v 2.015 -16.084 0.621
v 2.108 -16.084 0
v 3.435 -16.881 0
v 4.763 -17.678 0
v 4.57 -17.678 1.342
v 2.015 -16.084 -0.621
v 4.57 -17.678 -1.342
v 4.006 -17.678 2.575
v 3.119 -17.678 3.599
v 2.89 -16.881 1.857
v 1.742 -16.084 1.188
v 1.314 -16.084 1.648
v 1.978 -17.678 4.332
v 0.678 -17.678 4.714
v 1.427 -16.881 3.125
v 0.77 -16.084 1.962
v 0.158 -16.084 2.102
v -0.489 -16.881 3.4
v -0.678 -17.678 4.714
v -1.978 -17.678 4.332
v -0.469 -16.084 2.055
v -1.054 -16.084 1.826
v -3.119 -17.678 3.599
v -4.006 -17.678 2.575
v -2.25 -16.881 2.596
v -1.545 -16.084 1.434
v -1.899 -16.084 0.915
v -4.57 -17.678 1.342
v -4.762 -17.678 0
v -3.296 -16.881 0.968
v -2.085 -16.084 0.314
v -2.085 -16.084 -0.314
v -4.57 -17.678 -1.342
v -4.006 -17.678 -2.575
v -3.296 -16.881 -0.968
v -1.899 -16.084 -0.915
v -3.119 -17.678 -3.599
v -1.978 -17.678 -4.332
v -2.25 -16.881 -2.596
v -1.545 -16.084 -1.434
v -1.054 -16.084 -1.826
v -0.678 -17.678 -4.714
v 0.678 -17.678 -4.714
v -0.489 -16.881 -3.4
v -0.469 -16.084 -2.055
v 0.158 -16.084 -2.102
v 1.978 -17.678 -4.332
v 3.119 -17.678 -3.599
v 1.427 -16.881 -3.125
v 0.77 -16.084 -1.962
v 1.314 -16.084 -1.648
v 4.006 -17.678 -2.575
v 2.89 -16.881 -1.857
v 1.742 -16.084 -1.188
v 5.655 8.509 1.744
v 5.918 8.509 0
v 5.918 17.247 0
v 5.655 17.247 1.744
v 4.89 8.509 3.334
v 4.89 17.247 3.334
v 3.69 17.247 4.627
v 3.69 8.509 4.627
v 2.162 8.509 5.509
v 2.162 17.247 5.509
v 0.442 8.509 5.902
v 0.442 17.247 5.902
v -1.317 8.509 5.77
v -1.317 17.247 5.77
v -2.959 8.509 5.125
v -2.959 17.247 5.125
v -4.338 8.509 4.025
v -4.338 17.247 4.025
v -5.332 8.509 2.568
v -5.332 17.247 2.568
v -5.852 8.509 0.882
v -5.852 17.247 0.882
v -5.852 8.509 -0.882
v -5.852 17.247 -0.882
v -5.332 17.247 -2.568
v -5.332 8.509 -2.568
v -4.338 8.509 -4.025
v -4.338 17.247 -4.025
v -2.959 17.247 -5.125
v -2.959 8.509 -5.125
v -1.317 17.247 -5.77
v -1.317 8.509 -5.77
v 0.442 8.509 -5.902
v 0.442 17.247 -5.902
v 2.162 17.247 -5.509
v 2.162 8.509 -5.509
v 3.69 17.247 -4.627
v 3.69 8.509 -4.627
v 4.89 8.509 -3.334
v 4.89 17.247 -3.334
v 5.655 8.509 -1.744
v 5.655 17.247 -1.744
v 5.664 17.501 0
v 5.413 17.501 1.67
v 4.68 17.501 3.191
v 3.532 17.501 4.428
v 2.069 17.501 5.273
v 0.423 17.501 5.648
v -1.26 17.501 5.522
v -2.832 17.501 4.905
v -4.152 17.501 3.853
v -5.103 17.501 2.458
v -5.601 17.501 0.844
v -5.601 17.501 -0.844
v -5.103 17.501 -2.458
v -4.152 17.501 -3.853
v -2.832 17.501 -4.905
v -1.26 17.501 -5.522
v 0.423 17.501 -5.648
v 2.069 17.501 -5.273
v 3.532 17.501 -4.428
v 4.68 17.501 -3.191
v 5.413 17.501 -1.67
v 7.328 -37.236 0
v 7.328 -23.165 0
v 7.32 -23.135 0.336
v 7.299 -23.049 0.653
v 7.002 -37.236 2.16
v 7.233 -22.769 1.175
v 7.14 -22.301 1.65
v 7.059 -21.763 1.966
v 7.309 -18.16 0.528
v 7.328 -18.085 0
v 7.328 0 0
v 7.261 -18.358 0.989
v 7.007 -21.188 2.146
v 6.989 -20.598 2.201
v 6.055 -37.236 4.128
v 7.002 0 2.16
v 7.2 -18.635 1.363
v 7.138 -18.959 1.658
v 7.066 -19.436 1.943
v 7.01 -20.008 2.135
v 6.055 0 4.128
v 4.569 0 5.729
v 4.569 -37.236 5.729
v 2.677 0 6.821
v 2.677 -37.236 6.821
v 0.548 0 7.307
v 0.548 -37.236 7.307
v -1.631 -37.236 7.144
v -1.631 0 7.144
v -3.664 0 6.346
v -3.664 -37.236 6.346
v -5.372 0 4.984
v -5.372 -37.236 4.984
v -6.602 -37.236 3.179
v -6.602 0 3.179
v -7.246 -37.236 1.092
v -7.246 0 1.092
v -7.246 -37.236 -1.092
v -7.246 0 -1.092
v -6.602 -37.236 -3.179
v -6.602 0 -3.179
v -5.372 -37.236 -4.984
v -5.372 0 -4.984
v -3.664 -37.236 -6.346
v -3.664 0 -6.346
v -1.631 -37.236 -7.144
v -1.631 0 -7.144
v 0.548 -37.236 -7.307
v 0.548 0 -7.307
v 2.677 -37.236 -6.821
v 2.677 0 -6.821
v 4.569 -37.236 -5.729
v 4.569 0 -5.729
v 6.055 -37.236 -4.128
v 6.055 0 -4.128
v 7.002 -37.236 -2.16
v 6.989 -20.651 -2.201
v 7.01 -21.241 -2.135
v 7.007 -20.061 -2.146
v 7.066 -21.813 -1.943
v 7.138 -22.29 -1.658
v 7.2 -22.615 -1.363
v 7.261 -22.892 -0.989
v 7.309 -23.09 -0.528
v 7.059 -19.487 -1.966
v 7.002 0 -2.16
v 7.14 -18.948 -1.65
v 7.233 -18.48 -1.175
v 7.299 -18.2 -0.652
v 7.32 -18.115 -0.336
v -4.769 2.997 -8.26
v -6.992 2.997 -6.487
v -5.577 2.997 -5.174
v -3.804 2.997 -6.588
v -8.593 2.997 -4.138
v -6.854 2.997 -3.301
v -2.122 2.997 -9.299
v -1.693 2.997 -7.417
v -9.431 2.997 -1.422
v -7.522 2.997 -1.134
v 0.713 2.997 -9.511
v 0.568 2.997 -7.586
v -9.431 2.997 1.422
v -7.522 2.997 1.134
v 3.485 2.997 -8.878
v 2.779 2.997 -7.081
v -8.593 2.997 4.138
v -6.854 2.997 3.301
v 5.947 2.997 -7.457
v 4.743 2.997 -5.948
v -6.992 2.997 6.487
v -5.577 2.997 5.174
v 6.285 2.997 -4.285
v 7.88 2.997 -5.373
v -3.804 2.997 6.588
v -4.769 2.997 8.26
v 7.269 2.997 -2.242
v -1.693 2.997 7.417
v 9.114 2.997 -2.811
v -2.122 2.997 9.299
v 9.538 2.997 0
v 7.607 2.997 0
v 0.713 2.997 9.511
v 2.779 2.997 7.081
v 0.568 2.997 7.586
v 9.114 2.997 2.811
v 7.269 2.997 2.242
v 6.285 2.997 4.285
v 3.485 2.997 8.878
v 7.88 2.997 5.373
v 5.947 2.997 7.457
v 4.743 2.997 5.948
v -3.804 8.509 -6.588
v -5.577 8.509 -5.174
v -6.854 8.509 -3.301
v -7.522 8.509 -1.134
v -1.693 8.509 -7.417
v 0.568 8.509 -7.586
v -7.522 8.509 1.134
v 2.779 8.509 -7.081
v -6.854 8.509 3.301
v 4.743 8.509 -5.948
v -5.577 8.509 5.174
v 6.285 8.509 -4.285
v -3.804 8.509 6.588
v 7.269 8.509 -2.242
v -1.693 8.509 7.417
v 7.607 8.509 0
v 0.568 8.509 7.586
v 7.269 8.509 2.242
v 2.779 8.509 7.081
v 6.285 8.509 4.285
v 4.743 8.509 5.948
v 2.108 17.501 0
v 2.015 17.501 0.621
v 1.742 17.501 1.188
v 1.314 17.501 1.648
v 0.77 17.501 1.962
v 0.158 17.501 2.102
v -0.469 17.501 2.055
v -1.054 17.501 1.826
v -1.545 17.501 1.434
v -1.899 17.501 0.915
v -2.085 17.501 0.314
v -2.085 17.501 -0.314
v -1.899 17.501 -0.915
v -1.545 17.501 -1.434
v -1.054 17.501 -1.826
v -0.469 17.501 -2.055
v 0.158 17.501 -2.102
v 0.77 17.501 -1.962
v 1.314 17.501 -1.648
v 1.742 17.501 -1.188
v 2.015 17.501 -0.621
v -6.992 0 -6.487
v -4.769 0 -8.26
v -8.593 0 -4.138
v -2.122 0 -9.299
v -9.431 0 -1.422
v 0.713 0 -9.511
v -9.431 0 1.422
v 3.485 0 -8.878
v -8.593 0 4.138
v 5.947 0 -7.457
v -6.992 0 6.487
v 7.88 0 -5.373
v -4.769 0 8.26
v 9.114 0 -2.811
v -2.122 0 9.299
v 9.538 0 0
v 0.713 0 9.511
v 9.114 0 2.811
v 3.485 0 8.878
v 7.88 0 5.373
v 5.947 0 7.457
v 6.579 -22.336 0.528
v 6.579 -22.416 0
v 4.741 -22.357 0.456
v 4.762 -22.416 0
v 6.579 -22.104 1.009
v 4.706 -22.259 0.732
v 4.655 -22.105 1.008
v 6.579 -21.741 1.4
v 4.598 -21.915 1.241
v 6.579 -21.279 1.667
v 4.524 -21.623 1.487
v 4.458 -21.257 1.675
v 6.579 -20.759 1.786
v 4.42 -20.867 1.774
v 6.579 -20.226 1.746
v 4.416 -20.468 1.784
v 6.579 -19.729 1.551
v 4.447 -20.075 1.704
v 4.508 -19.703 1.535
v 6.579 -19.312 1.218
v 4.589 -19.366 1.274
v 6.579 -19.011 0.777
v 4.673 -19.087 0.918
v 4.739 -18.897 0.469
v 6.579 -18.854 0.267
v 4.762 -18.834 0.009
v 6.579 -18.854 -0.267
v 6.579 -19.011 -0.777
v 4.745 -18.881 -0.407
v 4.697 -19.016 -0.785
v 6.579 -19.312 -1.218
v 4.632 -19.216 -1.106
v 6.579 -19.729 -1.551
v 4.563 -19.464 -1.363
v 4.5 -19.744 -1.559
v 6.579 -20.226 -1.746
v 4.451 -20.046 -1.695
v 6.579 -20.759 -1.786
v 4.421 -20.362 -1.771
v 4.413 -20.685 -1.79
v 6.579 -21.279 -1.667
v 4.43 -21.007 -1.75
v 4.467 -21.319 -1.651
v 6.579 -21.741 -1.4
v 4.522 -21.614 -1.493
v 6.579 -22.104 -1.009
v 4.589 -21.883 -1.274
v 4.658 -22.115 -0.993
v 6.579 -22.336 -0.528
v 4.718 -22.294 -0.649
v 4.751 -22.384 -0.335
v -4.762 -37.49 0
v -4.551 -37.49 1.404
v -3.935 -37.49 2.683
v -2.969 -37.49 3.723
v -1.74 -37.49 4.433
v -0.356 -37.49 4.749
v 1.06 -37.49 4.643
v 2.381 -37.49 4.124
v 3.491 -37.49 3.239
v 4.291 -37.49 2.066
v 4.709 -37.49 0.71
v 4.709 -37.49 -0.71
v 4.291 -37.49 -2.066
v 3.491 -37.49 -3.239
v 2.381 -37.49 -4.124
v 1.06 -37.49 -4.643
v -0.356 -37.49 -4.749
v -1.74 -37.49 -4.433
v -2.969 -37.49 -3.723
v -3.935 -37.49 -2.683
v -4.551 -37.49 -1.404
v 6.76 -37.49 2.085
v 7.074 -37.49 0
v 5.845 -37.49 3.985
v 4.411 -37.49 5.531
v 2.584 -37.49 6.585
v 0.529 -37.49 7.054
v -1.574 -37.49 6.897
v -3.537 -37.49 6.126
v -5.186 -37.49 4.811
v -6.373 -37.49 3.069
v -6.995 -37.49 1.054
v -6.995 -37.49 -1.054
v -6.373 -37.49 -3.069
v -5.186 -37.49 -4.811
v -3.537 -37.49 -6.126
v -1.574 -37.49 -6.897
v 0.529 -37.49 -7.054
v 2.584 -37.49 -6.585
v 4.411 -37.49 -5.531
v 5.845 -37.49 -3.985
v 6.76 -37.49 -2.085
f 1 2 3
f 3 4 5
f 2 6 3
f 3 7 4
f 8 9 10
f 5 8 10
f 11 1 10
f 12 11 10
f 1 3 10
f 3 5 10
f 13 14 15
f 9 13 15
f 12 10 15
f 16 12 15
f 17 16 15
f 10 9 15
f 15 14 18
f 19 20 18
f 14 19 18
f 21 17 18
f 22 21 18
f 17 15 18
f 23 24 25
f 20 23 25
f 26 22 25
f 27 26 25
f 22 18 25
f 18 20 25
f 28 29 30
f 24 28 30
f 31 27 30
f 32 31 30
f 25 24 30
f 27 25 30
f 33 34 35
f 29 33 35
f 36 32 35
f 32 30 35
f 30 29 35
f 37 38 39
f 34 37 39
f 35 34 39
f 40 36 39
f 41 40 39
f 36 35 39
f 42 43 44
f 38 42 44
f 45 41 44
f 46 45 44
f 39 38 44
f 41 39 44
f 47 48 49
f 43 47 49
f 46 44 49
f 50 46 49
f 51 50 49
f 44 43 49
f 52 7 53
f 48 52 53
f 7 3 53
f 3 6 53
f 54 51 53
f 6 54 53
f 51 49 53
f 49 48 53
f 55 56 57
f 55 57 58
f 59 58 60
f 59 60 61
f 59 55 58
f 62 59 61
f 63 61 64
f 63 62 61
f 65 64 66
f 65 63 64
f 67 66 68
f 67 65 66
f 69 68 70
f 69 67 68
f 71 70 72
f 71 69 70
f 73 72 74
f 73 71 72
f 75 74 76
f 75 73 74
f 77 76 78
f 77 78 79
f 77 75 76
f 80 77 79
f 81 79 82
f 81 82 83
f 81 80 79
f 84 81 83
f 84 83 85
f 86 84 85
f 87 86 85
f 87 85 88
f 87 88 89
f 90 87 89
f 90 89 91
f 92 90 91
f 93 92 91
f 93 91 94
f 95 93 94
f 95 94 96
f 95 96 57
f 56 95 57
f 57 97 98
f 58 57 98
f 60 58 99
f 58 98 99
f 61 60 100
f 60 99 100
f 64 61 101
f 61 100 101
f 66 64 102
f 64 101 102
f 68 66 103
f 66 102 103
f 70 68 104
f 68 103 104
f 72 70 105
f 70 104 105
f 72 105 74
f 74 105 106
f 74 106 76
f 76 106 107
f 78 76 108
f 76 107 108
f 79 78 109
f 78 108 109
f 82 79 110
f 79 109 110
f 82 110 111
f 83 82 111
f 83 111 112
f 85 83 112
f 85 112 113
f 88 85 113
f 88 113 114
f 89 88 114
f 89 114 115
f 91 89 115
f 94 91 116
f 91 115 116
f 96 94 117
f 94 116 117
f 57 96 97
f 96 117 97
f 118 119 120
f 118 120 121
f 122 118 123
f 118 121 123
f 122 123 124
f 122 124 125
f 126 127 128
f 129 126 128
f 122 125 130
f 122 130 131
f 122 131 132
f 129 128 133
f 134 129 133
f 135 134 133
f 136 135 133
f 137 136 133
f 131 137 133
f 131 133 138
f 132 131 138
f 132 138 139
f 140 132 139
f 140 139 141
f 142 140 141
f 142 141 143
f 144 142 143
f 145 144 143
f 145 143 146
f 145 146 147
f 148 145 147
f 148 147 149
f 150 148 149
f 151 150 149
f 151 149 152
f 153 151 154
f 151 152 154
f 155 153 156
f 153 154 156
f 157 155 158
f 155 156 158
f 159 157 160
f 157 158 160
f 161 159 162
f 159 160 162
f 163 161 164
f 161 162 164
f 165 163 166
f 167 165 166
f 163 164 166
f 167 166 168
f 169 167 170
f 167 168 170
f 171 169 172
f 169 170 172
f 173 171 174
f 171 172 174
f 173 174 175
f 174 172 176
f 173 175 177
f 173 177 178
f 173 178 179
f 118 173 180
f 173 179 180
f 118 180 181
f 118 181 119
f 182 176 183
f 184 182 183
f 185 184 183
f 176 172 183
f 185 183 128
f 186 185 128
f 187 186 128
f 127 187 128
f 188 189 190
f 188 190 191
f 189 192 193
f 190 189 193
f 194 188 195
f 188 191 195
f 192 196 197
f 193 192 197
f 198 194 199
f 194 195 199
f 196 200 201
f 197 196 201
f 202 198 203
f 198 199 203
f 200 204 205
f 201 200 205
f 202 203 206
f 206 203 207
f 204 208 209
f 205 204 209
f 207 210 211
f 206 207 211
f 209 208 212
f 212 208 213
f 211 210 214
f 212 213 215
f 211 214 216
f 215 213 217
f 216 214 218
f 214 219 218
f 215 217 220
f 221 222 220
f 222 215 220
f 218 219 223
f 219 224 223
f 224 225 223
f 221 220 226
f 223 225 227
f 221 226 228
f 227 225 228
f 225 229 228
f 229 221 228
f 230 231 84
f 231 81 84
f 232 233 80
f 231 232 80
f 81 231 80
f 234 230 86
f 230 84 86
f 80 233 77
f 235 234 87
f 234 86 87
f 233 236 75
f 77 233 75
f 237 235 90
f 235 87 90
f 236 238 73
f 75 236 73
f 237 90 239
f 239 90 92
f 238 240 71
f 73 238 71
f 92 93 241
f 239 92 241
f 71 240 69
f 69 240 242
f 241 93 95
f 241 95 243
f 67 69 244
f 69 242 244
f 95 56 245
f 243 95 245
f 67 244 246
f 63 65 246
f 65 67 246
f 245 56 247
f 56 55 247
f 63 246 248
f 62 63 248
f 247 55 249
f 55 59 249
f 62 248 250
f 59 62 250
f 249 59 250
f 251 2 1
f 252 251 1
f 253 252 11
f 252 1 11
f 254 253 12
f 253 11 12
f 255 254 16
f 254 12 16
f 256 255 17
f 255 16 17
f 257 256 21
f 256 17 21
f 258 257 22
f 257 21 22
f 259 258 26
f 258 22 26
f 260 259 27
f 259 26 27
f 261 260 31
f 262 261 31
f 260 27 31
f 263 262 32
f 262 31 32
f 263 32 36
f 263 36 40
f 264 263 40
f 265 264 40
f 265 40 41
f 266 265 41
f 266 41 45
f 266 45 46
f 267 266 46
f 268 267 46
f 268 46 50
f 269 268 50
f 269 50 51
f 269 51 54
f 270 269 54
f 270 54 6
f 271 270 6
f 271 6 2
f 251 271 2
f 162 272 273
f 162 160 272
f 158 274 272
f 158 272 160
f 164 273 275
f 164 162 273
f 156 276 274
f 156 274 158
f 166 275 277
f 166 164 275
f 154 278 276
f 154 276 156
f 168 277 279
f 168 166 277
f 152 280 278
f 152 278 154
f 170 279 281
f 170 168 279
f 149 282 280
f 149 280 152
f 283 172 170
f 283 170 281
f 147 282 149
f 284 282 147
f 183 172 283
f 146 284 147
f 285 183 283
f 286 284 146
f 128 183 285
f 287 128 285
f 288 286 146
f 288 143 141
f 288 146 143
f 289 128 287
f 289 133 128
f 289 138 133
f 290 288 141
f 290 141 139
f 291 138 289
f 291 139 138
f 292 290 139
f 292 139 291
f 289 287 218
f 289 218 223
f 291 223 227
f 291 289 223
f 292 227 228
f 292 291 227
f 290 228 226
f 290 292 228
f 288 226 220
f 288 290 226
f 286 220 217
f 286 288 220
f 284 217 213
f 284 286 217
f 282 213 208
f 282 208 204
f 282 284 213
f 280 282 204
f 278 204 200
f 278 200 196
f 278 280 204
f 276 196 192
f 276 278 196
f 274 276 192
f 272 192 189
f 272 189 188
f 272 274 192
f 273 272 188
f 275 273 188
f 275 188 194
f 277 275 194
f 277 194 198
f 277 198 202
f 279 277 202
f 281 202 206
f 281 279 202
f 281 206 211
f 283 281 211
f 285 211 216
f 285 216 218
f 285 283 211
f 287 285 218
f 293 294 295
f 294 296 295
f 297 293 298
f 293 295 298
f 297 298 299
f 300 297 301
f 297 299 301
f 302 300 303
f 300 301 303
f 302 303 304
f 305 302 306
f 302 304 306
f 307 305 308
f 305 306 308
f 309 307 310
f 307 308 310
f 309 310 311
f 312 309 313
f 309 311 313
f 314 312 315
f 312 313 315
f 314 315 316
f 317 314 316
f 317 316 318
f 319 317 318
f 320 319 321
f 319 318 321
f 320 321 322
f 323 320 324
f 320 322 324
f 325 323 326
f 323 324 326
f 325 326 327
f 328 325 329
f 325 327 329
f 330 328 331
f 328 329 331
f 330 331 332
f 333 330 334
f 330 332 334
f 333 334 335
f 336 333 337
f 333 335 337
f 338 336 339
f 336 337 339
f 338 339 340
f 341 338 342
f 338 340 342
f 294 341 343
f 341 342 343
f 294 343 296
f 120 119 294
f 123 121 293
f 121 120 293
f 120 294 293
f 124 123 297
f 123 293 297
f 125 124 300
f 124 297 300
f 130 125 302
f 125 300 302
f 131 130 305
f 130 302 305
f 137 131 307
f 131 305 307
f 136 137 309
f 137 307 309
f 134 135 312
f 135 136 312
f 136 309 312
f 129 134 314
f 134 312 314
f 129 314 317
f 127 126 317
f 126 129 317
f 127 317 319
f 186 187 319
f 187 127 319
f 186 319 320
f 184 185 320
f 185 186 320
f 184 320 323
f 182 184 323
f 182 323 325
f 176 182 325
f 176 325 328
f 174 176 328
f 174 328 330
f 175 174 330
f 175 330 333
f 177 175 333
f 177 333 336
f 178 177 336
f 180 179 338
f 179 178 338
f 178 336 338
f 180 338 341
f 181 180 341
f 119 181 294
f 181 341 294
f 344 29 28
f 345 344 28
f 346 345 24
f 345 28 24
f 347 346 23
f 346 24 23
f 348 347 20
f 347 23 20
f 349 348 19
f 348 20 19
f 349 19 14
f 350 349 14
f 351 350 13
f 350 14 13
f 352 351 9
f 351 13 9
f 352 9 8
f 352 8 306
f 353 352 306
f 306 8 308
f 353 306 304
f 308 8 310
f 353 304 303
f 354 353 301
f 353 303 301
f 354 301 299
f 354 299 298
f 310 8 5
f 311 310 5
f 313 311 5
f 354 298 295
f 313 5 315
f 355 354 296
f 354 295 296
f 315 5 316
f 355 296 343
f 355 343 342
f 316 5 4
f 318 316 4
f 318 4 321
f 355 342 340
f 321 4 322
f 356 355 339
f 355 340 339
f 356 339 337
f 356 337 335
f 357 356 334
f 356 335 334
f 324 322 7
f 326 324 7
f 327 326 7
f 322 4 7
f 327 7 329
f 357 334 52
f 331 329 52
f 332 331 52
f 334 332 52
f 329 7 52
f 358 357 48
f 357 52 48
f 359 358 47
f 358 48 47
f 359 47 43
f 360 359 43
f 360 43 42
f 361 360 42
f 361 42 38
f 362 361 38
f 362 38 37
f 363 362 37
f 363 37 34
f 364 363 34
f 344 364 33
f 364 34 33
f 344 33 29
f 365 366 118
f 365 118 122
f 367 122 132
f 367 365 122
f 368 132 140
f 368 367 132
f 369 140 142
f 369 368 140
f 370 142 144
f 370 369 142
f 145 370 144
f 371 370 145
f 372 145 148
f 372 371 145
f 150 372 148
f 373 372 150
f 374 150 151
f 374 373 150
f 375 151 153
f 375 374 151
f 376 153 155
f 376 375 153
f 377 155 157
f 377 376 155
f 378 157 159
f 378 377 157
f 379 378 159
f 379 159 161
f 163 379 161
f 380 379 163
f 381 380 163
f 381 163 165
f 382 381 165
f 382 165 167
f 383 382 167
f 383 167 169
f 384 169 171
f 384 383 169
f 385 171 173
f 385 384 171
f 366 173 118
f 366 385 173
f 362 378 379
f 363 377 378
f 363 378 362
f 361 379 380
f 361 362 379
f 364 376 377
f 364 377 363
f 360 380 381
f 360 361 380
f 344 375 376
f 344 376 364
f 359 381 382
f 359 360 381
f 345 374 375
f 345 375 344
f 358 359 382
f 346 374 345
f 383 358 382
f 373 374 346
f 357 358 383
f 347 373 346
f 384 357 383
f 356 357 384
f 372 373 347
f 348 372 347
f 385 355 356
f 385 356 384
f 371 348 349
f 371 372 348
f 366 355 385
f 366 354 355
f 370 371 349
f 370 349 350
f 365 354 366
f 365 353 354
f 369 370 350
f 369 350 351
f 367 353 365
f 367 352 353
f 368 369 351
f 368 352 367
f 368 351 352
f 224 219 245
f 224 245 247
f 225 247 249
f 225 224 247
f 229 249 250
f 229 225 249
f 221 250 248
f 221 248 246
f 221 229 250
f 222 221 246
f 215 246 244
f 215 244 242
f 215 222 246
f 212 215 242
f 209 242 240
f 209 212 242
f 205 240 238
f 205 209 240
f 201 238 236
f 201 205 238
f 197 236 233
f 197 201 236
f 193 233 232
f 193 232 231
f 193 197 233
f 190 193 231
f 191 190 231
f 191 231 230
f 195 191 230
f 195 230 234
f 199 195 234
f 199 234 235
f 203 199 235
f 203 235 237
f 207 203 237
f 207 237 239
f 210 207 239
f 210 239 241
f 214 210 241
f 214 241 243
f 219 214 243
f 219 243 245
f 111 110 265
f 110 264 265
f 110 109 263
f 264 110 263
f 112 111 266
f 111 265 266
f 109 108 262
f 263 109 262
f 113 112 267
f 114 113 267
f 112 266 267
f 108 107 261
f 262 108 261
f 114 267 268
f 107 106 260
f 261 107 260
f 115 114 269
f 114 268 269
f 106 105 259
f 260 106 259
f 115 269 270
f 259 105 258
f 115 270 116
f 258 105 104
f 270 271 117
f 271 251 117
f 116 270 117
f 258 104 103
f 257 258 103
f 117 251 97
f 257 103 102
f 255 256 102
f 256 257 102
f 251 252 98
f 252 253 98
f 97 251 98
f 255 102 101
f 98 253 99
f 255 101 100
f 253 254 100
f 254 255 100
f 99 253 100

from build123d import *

# Parameters (mm, degrees)
F0_R            = 7.3279
F5_DEPTH        = 37.4904
F1_R            = 9.5377
F6_DEPTH        = 2.9972
F3_R            = 7.6073
F7_DEPTH        = 8.509
F4_R            = 5.9182
F8_DEPTH        = 17.5006
F9_SIZE         = 0.254
F11_D           = 9.525
F11_DEPTH       = 19.812
F11_TIP         = 2.8615986981
F13_D           = 4.2164
F17_D           = 3.5814
F17_DEPTH       = 6.35
F17_CSINK_D     = 5.08
F17_CSINK_ANGLE = 90
F17_TIP         = 1.0759611105


with BuildPart() as f5:
    # F0 (on Front) → F5 (new body)
    with BuildSketch(Plane.XZ):
        Circle(F0_R)
    extrude(amount=F5_DEPTH)

    # F1 (on Front) → F6 (join)
    with BuildSketch(Plane.XZ):
        Circle(F1_R)
    extrude(amount=-F6_DEPTH)

    # F3 (on Front) → F7 (join)
    with BuildSketch(Plane.XZ):
        Circle(F3_R)
    extrude(amount=-F7_DEPTH)

    # F4 (on Front) → F8 (join)
    with BuildSketch(Plane.XZ):
        Circle(F4_R)
    extrude(amount=-F8_DEPTH)

    # F9
    f9_edges = [f5.edges().sort_by_distance(p)[0] for p in [
        (-7.3279, -37.4904, 0),
        (-5.9182, 17.5006, 0),
    ]]
    chamfer(f9_edges, length=F9_SIZE)

    # F11
    with Locations(Plane.XZ.offset(37.4904)):
        with Locations((0, 0)):
            Hole(F11_D / 2, depth=F11_DEPTH)
            with Locations((0, 0, -(F11_DEPTH + F11_TIP / 2))):  # 118° drill point
                Cone(0, F11_D / 2, F11_TIP, mode=Mode.SUBTRACT)

    # F13 (through all)
    with Locations(Plane(origin=(0, 17.5006, 0), x_dir=(-1, 0, 0), z_dir=(0, 1, 0))):
        with Locations((0, 0)):
            Hole(F13_D / 2)

    # F17
    with Locations(Plane.YZ.offset(7.3279)):
        with Locations((-20.6248, 0)):
            CounterSinkHole(F17_D / 2, F17_CSINK_D / 2, depth=F17_DEPTH, counter_sink_angle=F17_CSINK_ANGLE)
            with Locations((0, 0, -(F17_DEPTH + F17_TIP / 2))):  # 118° drill point
                Cone(0, F17_D / 2, F17_TIP, mode=Mode.SUBTRACT)


solid = f5.part
